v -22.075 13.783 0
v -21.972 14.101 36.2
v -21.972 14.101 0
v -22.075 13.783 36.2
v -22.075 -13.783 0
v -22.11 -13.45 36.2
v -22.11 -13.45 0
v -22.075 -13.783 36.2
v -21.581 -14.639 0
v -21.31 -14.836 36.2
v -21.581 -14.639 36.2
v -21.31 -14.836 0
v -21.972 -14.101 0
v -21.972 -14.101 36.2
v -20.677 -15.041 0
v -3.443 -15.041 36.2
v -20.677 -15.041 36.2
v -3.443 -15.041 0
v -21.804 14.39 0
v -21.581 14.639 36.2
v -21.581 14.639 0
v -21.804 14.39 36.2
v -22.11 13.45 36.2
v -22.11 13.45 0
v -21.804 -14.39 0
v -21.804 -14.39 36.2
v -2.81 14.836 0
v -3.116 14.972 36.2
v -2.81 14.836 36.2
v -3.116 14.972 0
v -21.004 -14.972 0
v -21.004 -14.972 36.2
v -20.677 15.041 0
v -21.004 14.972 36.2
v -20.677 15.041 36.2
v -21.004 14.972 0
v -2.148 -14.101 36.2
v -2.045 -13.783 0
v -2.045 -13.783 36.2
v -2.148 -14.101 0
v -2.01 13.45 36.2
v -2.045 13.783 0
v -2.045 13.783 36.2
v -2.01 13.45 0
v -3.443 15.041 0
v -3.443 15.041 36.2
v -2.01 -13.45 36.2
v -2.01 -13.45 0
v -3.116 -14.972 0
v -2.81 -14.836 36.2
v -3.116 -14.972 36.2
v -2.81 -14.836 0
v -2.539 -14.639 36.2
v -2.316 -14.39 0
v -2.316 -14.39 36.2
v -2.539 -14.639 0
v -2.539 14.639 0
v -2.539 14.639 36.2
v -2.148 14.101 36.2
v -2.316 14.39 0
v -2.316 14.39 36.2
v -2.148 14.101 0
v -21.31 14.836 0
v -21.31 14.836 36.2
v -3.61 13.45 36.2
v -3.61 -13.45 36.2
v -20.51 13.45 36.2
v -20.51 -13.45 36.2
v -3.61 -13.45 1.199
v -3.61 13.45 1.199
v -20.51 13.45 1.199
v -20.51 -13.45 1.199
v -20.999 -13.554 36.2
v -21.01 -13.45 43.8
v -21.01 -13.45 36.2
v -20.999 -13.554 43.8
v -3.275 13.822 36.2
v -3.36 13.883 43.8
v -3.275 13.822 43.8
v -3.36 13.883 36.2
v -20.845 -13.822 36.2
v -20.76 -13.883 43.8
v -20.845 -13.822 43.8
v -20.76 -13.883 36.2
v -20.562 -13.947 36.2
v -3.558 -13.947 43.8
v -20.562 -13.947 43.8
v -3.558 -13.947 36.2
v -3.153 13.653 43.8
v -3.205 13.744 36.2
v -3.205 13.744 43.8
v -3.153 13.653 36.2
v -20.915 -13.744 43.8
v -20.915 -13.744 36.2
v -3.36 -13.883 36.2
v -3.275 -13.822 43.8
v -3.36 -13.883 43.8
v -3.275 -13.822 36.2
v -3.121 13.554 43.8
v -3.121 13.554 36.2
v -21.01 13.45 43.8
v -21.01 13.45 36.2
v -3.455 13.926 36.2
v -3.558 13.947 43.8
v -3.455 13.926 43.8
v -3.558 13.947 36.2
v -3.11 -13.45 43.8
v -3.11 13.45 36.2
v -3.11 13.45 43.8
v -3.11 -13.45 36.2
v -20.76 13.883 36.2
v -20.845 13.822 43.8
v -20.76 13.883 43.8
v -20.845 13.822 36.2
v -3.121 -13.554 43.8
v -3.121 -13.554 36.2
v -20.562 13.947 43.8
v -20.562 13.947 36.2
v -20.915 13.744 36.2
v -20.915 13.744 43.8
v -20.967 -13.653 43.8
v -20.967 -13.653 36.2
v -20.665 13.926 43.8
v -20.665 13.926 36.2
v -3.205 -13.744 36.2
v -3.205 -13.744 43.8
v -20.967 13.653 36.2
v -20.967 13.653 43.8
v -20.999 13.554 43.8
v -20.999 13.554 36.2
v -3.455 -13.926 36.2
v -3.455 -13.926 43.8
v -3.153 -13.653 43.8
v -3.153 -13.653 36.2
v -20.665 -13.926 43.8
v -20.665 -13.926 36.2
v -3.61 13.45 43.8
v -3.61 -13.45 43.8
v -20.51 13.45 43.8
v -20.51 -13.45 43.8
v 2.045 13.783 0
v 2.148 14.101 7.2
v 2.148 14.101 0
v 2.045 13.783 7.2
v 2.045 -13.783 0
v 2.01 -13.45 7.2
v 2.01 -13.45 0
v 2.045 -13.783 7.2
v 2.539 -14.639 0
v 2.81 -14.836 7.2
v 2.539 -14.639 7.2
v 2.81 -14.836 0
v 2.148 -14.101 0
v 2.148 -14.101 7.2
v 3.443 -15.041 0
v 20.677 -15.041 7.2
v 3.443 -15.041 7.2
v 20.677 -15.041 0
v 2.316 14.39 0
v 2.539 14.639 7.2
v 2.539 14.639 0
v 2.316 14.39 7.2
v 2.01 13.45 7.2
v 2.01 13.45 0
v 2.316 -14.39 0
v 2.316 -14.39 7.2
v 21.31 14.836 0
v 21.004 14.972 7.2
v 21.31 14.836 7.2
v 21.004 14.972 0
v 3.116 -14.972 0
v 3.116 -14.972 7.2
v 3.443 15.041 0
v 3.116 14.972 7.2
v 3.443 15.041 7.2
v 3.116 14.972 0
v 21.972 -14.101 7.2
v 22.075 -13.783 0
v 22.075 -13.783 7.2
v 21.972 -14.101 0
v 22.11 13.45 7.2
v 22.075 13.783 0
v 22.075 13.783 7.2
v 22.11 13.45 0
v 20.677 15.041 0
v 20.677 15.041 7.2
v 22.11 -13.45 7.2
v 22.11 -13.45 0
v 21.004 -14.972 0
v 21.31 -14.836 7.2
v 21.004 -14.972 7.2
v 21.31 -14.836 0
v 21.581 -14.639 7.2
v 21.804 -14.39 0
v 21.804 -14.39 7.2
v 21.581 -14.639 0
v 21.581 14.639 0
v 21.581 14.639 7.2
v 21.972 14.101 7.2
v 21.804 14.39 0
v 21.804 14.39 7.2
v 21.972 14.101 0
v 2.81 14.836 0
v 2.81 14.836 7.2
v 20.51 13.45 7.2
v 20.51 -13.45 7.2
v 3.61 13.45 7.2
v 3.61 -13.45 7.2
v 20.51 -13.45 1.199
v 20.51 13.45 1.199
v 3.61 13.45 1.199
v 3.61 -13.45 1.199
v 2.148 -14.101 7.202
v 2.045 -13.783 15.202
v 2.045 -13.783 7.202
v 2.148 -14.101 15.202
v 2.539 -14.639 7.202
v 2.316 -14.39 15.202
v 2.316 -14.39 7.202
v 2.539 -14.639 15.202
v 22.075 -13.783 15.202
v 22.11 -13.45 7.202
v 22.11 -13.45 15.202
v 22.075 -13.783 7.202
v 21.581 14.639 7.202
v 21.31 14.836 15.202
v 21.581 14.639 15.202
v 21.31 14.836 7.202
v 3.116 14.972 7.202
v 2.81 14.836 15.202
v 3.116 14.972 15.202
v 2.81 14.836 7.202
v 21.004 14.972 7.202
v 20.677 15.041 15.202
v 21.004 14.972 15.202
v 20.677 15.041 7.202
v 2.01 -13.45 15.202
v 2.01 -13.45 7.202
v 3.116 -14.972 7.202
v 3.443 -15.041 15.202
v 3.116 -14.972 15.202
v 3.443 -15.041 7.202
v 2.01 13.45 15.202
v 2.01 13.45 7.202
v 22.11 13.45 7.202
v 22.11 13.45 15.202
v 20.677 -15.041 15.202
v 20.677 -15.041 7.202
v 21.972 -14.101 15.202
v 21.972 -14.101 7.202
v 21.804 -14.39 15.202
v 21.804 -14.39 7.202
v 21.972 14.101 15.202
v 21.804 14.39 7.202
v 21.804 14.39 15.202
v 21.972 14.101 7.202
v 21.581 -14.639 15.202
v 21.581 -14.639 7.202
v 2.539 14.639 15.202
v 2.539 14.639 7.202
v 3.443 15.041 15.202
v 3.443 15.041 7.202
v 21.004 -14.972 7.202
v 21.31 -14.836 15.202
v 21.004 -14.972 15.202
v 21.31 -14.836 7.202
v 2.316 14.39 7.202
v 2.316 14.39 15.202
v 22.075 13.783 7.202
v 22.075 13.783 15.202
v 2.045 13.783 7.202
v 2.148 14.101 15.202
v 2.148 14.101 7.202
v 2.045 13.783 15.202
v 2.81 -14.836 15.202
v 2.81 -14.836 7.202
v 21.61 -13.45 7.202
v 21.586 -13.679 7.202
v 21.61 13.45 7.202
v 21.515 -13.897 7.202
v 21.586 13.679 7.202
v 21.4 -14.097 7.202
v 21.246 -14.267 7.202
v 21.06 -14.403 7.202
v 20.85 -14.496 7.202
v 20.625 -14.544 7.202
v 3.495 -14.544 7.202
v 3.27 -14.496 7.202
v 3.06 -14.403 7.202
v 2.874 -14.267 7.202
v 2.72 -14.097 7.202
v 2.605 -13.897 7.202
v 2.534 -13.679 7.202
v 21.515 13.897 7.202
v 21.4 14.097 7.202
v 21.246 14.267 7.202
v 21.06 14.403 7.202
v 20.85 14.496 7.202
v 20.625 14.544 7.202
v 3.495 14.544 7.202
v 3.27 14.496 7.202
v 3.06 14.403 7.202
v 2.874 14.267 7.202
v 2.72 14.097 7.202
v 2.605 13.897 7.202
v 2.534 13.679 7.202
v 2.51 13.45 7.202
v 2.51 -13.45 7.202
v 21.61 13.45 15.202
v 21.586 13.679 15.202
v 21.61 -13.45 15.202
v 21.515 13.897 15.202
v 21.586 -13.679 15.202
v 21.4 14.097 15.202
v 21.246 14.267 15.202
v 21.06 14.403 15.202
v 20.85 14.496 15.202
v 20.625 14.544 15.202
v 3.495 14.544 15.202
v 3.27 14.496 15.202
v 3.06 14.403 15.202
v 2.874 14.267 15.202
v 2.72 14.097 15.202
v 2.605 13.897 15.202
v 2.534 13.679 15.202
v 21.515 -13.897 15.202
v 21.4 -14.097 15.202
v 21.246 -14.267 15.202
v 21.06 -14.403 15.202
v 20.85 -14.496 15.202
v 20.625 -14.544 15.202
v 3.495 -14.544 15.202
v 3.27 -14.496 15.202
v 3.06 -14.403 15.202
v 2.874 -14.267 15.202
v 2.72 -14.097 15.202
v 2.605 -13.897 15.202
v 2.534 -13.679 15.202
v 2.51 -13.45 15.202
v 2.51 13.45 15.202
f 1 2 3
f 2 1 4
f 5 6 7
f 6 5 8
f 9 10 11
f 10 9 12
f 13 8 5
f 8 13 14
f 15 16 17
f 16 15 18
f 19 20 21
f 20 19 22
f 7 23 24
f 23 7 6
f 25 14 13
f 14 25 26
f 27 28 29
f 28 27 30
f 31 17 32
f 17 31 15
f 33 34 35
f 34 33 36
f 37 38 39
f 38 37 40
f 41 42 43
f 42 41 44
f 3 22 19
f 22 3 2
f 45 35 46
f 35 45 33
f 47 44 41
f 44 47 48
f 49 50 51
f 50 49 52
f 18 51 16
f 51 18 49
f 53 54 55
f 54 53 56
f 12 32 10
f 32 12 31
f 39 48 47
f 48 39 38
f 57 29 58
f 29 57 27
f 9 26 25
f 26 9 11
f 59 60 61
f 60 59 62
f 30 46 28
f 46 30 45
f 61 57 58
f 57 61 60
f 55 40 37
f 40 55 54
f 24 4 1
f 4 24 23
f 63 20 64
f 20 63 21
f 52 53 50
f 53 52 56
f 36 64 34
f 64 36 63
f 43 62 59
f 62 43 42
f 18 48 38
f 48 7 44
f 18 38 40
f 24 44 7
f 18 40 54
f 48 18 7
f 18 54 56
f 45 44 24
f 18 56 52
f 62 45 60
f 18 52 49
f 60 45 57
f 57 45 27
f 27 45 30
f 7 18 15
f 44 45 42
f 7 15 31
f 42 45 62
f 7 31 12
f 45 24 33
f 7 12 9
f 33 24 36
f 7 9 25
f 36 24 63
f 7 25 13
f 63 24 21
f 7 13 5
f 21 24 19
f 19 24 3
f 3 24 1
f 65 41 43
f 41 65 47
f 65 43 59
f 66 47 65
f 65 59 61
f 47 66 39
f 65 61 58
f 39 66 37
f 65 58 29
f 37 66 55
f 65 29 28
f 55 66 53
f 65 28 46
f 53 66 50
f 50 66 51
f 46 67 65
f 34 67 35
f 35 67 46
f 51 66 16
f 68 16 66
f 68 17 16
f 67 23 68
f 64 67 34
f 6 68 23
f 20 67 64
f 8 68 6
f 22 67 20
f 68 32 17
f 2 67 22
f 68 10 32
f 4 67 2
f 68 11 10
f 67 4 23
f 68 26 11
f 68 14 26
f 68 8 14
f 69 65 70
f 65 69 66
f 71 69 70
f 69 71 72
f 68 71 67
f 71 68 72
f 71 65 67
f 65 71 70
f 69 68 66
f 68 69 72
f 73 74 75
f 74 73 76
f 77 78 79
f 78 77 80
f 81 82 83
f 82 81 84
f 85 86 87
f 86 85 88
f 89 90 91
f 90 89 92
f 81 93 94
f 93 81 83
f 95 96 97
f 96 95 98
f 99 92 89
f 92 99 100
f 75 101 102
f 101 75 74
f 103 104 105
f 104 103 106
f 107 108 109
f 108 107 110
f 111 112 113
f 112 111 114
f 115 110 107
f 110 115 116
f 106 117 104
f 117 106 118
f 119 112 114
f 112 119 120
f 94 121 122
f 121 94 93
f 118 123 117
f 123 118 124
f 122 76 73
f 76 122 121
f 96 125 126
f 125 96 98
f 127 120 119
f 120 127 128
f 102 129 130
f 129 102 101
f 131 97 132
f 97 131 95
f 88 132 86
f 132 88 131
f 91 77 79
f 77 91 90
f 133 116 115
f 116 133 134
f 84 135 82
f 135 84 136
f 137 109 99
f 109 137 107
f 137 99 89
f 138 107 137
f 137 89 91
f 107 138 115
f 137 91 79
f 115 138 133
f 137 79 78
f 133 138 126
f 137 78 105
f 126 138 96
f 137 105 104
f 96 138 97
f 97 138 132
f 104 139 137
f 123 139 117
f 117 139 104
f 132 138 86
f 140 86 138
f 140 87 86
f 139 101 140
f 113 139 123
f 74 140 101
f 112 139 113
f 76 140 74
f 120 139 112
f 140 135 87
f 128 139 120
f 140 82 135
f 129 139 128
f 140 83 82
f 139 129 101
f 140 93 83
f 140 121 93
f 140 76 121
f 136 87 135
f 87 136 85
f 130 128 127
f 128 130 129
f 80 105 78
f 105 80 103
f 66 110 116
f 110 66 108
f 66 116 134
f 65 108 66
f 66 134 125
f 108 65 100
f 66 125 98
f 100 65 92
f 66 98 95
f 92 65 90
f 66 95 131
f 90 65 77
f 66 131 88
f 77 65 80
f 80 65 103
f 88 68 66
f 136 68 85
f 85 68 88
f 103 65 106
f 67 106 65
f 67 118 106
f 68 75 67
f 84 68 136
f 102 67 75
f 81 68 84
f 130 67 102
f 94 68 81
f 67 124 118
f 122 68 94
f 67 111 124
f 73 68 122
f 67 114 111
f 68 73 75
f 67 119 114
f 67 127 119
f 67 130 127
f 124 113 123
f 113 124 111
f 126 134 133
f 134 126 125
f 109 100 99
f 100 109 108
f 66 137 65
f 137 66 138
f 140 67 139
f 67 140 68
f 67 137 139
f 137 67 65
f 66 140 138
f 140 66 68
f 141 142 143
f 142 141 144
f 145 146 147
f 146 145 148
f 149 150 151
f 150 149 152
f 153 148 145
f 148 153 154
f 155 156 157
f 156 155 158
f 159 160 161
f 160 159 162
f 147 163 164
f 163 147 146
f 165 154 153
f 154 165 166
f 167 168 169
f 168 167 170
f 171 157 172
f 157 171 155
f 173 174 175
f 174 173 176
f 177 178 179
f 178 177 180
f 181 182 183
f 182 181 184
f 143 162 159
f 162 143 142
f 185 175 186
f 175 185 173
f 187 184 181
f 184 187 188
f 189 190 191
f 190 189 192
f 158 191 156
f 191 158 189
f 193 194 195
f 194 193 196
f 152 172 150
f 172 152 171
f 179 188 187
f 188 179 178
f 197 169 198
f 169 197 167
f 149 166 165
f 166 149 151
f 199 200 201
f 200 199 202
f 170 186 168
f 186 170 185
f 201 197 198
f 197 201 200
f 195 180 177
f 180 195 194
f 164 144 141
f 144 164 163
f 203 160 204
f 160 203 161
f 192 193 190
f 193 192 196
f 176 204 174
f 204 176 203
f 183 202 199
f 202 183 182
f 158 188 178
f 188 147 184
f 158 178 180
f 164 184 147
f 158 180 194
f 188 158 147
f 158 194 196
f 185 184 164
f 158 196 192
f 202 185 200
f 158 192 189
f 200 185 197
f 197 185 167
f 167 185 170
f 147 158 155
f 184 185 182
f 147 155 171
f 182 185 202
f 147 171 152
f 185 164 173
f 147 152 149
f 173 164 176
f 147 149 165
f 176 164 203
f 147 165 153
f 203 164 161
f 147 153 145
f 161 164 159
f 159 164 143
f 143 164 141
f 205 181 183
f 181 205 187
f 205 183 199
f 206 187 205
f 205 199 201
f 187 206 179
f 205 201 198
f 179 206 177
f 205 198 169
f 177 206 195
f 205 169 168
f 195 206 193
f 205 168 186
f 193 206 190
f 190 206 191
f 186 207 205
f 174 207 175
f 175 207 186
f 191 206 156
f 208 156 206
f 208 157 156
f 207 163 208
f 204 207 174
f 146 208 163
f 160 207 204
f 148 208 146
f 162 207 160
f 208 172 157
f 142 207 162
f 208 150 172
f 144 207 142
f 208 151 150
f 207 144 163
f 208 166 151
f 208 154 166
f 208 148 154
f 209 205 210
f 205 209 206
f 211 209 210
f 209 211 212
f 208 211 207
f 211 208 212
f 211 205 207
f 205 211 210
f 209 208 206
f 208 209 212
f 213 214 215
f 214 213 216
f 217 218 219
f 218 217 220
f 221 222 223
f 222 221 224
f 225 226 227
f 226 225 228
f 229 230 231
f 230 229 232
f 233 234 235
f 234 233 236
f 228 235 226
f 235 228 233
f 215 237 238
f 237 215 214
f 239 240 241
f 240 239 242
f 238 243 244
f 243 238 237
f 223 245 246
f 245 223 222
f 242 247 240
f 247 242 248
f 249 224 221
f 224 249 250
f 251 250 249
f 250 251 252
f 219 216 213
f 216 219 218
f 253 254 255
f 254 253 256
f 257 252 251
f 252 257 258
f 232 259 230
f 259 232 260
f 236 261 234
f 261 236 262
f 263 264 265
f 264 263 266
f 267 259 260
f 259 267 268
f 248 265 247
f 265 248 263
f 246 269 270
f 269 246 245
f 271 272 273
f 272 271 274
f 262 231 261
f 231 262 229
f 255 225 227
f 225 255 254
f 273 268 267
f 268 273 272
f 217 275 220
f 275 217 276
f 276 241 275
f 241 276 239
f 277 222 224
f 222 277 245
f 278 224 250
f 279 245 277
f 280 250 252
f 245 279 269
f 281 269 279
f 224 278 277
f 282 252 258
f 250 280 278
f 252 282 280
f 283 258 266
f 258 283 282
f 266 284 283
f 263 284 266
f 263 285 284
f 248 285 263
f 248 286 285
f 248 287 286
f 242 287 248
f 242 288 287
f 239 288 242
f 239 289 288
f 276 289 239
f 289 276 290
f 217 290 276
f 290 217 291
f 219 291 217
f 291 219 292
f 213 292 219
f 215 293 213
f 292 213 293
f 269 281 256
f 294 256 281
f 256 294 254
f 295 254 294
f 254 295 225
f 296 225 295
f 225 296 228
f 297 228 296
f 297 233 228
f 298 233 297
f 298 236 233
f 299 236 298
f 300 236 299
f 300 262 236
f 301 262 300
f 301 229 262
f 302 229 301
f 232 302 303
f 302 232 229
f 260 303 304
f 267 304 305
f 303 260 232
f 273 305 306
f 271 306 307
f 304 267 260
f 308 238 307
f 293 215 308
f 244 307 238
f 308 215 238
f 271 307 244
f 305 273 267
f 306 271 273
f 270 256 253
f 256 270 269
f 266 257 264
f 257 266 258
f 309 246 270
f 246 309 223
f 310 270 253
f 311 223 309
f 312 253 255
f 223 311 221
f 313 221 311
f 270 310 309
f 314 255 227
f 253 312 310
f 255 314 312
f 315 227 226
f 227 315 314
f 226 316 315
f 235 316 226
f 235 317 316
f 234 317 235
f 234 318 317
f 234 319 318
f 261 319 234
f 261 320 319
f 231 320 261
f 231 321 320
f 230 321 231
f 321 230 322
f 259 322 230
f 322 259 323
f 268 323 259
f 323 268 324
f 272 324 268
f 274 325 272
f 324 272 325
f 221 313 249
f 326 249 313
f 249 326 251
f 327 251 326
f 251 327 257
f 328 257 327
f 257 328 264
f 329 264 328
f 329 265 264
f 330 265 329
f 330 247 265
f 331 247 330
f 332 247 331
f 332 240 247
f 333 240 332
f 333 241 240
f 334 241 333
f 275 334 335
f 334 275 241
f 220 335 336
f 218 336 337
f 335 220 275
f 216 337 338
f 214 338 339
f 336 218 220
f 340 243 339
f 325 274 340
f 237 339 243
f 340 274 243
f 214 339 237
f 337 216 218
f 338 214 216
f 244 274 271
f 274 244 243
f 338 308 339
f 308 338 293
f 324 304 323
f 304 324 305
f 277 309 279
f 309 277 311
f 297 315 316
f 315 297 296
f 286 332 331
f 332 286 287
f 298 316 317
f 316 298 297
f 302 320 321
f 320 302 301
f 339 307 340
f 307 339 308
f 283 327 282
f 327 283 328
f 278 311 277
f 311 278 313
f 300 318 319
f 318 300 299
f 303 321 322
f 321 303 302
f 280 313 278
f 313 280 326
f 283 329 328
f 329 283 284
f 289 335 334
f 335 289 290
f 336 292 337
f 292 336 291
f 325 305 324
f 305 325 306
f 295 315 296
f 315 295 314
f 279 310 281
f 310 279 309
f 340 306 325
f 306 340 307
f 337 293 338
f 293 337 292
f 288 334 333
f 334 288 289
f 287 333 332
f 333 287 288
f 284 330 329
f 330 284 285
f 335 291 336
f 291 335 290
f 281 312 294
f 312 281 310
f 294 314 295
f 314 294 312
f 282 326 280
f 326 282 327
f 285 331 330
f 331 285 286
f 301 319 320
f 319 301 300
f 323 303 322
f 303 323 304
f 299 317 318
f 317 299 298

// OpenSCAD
////----BoxLidInnerFit.scad----
////----OpenSCAD 2015.03-2----
////----2018.7.3----
////----By Kijja Chaovanakij----
////----default parameter for 9v battery box
////----If the wall's thickness of box & lip don't match, the script will stop. Then check the recommended value on the Console window.
////----If the lip wall's thickness and the nozzle head don't match. The some slicer will make an error.
////----2018.7.8----
////----Rename variable and add comment for open in the Customizer
////----2018.7.20---
////----Change the position of the box and lid. To the same level.

/* [var] */
//number of fragments[30=low:60=medium:90=high]
$fn=30;
//reduce garbage in preview[0.002]
garbage=0.002;
//1=yes other=no 
show_box=1;
//1=yes other=no
show_lid=1;

/* [inner box var(object size)] */
//inner or object tolerance[0.5]
inner_tolerence=0.5;
//inner or object width[16.4]
inner_width=16.4;
//inner or object length[26.4]
inner_length=26.4;
//inner or object height[48.5]
inner_height=48.5;

/* [box var] */
//lid & box fit[0.2]
box_tolerence=0.2;
//top, bottom thickness[1.2]
top_bottom_thickness=1.2;
//lid height[6], if [0] no vertical wall
lid_height=6;
//lip height[8]
lip_height=8;
//box wall thickness[1.6]
box_wall_thickness=1.6;
//lip wall thickness[0.4-0.8]
lip_wall_thickness=0.5;
////----end of customizer var----

////----main----
inner_wid=inner_width+inner_tolerence;
inner_len=inner_length+inner_tolerence;
inner_hi=inner_height+inner_tolerence;
//box corner radius
box_cor_rad=box_wall_thickness;
//box width
box_wid=inner_wid+box_wall_thickness*2;
//box length
box_len=inner_len+box_wall_thickness*2;
//box height
box_hi=inner_hi-lid_height-lip_height;

if (box_wall_thickness+0.001 < (lip_wall_thickness*2+box_tolerence*3)){
  box_wall_thickness=lip_wall_thickness*2+box_tolerence*3;
  echo();
  echo("Please increase box_wall_thickness=",box_wall_thickness);
  echo();
}
else {
  if (show_box==1)
    box();
  if (show_lid==1)
    lid();
  //echo("outer width=",box_wid);
  //echo("outer length=",box_len);
  //echo("outer height=",inner_hi+top_bottom_thickness*2);
}
////

////
module box()
translate([-box_wid*0.6,0,box_hi/2+top_bottom_thickness/2]){
  difference(){
    fillet_cube(box_hi+top_bottom_thickness,box_cor_rad);
    
    translate([0,0,top_bottom_thickness/2])
    cube([inner_wid,inner_len,box_hi+garbage],true);
  }
  
  color("tan")
  translate([0,0,(box_hi+lip_height+top_bottom_thickness-box_tolerence*2)/2])
  difference(){
    fillet_cube(lip_height-box_tolerence*2,lip_wall_thickness);
    
    cube([inner_wid,inner_len,lip_height-box_tolerence*2+garbage],true);
  }
}
////

////
module lid()
translate([box_wid*0.6,0,lid_height/2+top_bottom_thickness/2]){
  difference(){
    fillet_cube(lid_height+top_bottom_thickness,box_cor_rad);
    
    translate([0,0,top_bottom_thickness/2])
      cube([inner_wid,inner_len,lid_height+garbage],true);
  }

  color("tan")
  translate([0,0,(lid_height+lip_height+top_bottom_thickness)/2+garbage])
  difference(){
    fillet_cube(lip_height,box_cor_rad);
    fillet_cube(lip_height+garbage,lip_wall_thickness+box_tolerence*3);
  }
}
////

////
module fillet_cube(height,radius)
hull(){
  for (i=[-inner_wid/2,inner_wid/2])
  for (j=[-inner_len/2,inner_len/2])
    translate([i,j,0])
      cylinder(height,radius,radius,true);
}
////
